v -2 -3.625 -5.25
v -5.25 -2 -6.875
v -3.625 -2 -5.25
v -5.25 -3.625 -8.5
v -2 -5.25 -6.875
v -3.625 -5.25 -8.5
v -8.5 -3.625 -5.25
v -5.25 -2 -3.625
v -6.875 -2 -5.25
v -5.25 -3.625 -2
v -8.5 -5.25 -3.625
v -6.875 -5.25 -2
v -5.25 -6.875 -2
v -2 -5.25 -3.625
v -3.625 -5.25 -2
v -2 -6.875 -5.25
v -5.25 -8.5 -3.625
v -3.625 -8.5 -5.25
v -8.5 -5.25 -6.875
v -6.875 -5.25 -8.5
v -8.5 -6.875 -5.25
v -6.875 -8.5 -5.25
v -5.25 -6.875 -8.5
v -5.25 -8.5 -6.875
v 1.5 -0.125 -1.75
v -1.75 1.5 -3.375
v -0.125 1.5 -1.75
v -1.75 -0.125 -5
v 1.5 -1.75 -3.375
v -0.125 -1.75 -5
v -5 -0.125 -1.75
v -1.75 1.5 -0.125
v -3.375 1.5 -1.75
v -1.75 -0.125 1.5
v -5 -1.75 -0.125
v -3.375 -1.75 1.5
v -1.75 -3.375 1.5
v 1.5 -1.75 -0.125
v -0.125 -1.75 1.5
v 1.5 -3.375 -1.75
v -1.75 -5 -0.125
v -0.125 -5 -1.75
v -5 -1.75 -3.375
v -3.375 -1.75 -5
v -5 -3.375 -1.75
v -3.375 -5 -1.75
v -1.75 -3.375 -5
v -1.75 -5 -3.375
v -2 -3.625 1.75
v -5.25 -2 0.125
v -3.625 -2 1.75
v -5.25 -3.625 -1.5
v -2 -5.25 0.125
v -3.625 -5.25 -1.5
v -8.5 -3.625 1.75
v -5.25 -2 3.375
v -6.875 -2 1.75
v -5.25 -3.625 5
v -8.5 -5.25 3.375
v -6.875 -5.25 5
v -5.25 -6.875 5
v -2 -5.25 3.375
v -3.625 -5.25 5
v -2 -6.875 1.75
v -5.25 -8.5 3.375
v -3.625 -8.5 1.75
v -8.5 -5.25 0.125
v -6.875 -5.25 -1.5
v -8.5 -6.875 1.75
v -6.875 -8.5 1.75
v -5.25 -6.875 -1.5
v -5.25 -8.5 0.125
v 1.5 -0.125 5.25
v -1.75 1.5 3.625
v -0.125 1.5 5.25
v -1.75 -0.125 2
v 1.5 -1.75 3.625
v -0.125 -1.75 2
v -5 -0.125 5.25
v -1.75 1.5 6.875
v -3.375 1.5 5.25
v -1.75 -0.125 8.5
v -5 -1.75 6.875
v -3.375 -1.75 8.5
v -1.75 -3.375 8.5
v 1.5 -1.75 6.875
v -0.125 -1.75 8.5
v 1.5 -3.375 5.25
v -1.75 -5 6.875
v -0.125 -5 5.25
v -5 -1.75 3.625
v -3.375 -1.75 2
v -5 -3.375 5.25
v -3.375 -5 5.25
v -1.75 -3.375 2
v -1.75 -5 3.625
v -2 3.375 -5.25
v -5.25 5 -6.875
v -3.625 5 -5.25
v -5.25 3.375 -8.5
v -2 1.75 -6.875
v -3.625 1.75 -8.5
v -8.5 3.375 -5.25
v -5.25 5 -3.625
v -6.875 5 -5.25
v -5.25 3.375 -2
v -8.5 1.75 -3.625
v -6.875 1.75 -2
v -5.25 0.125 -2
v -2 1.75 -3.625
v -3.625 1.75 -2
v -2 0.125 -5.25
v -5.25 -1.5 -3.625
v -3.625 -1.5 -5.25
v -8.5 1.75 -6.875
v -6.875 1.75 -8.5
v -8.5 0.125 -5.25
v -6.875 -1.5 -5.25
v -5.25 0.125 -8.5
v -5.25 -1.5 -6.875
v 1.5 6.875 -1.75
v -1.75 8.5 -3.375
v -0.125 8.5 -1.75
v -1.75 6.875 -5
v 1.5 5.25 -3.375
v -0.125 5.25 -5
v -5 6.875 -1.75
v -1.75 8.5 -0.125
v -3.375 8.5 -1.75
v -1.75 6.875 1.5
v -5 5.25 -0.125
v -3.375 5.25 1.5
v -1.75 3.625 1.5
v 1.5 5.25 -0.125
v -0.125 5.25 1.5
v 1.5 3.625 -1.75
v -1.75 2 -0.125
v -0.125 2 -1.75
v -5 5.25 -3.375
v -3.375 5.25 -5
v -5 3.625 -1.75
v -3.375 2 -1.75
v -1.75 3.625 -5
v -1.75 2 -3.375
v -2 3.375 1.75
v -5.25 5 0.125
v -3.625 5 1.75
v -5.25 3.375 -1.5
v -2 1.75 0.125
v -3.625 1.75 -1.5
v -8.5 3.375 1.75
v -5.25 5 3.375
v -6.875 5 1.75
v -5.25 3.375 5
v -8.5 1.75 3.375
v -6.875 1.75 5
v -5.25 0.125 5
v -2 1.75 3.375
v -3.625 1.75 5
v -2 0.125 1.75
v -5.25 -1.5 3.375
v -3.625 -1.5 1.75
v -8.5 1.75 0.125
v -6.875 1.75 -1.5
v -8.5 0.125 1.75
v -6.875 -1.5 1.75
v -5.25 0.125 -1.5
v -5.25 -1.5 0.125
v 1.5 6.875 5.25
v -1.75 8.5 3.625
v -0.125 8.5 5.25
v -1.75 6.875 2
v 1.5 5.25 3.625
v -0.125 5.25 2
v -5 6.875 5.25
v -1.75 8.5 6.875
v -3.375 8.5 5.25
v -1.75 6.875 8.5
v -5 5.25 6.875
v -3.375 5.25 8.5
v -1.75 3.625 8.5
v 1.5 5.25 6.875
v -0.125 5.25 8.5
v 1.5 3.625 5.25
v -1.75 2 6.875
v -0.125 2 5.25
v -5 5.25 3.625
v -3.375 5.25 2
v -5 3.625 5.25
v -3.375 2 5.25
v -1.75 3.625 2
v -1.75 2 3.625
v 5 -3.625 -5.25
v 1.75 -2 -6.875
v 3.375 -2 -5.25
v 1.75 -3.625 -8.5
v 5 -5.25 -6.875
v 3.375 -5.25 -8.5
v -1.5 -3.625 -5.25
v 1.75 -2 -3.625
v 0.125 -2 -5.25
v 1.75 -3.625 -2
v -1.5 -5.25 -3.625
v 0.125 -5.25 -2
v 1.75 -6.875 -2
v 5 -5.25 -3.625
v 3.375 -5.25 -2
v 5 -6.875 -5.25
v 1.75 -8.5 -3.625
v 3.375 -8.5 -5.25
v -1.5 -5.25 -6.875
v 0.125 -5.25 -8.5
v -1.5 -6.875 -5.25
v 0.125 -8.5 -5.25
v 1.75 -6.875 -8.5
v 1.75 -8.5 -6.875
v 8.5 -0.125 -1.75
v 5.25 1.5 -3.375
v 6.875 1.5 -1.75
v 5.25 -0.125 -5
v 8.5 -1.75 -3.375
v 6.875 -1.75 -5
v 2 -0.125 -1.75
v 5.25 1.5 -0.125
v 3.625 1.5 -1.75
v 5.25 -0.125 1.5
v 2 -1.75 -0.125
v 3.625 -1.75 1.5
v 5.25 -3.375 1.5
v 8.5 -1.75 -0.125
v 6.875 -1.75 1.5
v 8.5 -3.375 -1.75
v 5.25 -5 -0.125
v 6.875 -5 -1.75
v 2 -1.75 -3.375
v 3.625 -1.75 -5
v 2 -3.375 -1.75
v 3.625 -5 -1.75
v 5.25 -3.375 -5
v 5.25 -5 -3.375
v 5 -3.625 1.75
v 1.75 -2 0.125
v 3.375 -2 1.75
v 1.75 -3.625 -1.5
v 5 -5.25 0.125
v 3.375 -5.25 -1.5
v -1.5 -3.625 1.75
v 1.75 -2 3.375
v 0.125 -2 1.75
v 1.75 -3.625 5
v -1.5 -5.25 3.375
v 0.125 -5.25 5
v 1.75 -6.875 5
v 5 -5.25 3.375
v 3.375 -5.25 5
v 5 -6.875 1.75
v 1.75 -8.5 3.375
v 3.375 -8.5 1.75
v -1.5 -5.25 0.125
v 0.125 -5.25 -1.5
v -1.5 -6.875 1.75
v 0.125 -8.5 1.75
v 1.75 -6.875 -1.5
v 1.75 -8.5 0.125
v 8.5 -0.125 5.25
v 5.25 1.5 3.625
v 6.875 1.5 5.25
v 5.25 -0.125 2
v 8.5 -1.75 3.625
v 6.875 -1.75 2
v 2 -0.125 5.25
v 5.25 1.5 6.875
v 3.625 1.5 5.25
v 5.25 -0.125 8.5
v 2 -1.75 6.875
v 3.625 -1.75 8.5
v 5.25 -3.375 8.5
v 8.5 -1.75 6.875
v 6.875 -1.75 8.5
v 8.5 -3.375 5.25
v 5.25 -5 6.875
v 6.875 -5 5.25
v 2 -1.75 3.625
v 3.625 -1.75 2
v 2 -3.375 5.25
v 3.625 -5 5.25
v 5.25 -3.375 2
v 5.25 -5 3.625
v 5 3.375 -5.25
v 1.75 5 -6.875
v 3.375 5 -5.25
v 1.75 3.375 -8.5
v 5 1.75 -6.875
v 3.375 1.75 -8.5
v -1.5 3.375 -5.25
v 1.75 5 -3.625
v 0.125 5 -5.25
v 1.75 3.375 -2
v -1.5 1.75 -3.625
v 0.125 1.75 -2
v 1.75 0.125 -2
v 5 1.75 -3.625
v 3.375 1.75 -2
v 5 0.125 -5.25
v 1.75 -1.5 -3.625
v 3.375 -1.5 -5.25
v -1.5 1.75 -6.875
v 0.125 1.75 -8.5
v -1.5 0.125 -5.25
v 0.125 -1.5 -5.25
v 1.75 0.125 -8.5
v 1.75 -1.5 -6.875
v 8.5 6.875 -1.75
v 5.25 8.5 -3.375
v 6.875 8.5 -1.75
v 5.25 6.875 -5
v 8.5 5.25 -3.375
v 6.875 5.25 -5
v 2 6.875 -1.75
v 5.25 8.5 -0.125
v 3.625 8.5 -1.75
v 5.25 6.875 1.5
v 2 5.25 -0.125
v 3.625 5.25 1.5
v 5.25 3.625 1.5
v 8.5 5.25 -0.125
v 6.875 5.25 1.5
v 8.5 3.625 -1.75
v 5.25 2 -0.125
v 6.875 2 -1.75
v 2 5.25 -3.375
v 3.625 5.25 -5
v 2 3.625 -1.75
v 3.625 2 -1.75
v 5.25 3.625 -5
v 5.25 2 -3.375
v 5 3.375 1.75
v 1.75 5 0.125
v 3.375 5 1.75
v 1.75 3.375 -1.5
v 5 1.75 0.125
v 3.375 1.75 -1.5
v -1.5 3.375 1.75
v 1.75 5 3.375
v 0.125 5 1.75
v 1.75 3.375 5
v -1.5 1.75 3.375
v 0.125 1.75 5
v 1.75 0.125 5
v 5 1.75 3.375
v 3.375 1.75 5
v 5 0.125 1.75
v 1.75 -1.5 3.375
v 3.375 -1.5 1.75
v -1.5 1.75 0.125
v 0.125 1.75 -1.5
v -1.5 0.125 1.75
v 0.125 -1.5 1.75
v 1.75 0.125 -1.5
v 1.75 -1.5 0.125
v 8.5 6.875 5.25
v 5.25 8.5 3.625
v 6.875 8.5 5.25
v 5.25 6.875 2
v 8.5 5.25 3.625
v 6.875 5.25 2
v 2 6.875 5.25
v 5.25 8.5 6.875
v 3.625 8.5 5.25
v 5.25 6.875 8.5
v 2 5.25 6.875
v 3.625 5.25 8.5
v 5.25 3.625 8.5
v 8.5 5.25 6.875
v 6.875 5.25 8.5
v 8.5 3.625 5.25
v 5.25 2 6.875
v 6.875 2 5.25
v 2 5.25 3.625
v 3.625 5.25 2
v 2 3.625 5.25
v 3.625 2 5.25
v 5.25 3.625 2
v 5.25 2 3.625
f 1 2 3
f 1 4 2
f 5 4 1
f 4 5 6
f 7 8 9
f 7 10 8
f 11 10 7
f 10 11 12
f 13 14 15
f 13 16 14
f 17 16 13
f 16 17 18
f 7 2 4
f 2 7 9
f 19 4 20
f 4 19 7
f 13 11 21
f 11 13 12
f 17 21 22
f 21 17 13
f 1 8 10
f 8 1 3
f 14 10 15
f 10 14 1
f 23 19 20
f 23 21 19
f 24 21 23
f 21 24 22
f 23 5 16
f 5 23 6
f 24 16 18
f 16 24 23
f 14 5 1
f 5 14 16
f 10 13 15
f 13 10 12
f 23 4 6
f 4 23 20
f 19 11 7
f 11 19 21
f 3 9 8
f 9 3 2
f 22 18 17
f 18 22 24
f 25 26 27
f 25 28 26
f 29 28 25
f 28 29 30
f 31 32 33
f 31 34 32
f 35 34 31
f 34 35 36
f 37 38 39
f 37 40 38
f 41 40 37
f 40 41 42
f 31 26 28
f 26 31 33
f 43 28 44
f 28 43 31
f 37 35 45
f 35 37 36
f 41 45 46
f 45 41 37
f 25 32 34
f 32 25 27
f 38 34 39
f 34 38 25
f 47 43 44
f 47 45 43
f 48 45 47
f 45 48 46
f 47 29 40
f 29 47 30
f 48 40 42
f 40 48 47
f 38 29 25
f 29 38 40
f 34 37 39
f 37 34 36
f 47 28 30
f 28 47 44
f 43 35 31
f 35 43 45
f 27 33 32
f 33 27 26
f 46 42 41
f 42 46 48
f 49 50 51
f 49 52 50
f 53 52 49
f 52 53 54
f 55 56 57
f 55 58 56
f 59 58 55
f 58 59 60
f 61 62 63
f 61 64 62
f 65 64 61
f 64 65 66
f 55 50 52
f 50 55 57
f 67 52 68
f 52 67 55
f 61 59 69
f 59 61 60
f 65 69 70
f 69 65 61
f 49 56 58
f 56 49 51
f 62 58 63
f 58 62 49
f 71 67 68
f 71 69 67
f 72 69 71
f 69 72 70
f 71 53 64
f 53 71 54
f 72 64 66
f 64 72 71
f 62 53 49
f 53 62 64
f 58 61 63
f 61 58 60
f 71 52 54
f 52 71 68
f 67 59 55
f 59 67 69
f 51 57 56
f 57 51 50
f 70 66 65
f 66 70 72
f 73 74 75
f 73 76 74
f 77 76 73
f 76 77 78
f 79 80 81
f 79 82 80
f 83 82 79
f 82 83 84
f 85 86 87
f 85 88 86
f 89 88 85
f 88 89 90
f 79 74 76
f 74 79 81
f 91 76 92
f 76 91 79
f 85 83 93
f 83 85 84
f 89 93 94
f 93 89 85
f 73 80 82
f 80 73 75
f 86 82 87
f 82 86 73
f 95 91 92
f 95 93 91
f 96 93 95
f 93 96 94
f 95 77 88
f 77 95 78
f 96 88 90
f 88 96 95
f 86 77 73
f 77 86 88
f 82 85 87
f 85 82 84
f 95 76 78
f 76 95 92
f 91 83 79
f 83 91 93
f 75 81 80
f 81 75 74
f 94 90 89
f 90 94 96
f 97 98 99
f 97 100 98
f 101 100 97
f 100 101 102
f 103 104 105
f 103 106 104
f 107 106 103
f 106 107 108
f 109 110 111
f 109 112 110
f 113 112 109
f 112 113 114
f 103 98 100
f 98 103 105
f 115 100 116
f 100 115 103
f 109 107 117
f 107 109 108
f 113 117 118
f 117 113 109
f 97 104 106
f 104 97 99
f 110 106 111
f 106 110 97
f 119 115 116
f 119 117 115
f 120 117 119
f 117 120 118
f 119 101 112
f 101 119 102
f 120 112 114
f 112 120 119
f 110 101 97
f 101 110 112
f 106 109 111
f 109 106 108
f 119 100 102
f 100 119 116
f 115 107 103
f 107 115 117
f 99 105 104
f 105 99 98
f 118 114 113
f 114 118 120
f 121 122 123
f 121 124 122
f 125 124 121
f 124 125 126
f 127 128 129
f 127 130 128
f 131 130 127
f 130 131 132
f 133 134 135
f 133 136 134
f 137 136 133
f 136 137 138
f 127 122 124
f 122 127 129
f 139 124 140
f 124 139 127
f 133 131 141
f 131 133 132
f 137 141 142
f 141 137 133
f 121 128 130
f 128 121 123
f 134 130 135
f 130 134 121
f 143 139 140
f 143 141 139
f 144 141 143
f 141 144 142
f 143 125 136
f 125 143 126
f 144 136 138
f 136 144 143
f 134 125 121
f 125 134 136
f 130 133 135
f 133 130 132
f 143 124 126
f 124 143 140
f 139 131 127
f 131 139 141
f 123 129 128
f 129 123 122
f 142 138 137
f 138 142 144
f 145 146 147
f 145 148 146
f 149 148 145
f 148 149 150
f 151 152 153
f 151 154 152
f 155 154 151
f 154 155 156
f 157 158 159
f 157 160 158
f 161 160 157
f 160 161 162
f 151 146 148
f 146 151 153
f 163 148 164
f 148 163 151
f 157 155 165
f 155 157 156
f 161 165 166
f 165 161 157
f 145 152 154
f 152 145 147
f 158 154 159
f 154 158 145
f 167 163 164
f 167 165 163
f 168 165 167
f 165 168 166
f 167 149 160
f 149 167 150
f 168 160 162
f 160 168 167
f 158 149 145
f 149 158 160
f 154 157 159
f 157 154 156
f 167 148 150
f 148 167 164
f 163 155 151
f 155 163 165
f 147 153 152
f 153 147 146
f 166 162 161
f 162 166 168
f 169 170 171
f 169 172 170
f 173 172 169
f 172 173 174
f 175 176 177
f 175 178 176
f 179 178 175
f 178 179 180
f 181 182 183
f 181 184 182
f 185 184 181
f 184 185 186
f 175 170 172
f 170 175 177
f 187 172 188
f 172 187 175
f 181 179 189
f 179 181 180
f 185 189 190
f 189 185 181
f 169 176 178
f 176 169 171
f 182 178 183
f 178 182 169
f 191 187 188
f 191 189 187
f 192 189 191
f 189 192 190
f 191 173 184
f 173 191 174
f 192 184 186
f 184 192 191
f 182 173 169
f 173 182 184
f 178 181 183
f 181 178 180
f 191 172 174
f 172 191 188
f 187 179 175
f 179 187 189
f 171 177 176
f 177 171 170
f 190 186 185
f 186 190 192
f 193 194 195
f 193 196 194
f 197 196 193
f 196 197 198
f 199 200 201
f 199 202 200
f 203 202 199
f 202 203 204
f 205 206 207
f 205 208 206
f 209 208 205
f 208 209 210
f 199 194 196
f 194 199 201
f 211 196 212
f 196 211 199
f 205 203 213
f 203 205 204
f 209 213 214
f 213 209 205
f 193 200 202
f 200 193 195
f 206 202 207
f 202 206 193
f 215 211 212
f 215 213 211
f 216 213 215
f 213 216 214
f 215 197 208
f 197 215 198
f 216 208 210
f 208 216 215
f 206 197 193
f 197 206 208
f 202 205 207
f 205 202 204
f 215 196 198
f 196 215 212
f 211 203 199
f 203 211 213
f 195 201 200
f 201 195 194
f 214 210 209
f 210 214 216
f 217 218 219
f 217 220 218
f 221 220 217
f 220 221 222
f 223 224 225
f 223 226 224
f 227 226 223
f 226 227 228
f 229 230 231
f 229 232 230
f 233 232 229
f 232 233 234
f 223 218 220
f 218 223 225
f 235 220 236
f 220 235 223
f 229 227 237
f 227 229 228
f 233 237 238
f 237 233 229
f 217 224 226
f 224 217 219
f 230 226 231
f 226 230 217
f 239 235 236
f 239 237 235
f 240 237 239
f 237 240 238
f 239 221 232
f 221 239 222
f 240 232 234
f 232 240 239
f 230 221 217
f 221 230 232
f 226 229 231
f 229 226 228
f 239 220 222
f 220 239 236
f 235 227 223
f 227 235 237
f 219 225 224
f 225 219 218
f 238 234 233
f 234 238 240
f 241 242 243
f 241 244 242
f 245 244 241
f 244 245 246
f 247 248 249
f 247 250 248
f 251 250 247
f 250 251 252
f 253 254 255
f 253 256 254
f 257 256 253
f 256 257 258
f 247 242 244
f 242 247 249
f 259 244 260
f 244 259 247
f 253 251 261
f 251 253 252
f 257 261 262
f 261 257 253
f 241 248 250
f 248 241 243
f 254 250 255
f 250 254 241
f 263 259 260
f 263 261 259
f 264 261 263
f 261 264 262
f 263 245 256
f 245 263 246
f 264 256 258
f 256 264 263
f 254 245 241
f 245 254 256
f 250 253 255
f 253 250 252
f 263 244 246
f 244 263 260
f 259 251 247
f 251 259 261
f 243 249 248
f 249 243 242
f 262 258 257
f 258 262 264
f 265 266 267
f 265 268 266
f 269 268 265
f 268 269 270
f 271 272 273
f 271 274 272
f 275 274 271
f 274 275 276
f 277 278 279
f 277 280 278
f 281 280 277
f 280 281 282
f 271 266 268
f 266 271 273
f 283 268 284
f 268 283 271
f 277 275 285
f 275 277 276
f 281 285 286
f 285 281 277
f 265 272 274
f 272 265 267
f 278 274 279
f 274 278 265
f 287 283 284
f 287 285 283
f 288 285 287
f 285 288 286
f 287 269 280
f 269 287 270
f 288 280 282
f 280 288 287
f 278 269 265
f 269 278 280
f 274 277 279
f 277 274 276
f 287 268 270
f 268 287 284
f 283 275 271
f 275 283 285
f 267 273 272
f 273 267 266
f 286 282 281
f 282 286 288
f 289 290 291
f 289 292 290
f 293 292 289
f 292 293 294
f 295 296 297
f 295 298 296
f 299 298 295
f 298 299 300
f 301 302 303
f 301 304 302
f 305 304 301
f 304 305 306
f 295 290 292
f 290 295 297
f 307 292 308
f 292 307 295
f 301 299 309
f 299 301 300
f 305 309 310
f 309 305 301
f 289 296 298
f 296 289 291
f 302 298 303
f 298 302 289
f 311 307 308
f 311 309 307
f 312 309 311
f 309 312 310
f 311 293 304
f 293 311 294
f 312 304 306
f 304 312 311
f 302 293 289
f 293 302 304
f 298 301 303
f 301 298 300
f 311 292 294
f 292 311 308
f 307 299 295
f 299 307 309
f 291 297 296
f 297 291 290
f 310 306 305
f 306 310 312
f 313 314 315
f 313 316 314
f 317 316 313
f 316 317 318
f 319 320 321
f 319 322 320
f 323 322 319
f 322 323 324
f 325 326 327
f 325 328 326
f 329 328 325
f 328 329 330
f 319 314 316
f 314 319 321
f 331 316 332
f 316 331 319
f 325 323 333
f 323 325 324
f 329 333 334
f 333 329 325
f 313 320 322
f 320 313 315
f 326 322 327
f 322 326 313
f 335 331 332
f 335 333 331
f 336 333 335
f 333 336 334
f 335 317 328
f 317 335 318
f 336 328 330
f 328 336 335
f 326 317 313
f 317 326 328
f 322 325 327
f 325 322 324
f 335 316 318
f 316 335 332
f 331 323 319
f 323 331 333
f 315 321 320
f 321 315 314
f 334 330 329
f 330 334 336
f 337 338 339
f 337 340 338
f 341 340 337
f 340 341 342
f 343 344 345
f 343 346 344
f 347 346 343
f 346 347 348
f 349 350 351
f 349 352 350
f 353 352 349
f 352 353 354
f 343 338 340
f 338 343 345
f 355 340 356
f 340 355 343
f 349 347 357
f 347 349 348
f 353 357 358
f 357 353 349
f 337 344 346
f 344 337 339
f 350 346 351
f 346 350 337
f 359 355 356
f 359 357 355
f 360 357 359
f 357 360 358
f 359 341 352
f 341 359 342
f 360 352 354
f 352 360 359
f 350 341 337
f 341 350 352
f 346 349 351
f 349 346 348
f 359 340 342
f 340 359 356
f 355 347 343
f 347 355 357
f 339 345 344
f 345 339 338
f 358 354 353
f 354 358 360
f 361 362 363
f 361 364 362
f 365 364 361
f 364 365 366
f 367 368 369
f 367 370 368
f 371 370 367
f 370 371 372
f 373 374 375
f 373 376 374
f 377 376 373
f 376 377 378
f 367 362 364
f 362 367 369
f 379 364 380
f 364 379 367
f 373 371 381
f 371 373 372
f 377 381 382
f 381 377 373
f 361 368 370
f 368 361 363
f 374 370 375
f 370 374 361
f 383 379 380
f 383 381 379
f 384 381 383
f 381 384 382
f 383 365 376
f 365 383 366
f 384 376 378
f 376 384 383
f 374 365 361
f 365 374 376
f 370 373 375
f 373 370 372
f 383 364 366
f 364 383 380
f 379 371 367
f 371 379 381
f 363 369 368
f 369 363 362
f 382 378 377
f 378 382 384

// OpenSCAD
//Size of a cavity
size=7; // [5:50]

//Wall thickness
thick = 0.5; //[0.5:0.1:2]

//Repetition
repeat = 2; // [1:50]

//Polyhedron type
poly=1; //[1:Truncated Octahedron=BCC, 2: Rhombohedron=FCC]

module rhombohedron(){
    render(){
        intersection(){
            cylinder(h=2,center=true,$fn=4);
            rotate([90,0,0])
                cylinder(h=2,center=true,$fn=4);
            rotate([0,90,0])
                cylinder(h=2,center=true,$fn=4);
        }
    }
}

module void_rhombo(size, thick, rep){
    thick0 = thick * sqrt(2);
    for(ix=[-rep[0]/2+0.25:rep[0]/2-0.75]){
        x = ix*size;
        for(iy=[-rep[1]/2+0.25:rep[1]/2-0.75]){
            y = iy*size;
            for(iz=[-rep[2]/2+0.25:rep[2]/2-0.75]){
                z = iz*size;
                translate([x,y,z]){
                    scale((size-thick0)/2){
                        rhombohedron();
                    }
                }
                translate([x,y+size/2,z+size/2]){
                    scale((size-thick0)/2){
                        rhombohedron();
                    }
                }
                translate([x+size/2,y,z+size/2]){
                    scale((size-thick0)/2){
                        rhombohedron();
                    }
                }
                translate([x+size/2,y+size/2,z]){
                    scale((size-thick0)/2){
                        rhombohedron();
                    }
                }
            }
        }
    }
}


        
module octahedron(){
    polyhedron(points=[[0,0,-1],[1,0,0],[0,1,0],[-1,0,0],[0,-1,0],[0,0,1]],faces=[[0,1,2],[0,2,3],[0,3,4],[0,4,1],[5,2,1],[5,3,2],[5,4,3],[5,1,4]]);
}


module truncocta(){
    render(){
        intersection(){
            scale(1.5)
                octahedron();
            scale(2)
                cube(center=true);
        }
    }
}


module void_truncocta(size, thick, rep=[1,1,1]){
    for(x=[-rep[0]/2+0.25:rep[0]/2-0.75]){
        for(y=[-rep[1]/2+0.25:rep[1]/2-0.75]){
            for(z=[-rep[2]/2+0.25:rep[2]/2-0.75]){
                translate([size*x,size*y,size*z])
                    scale((size-thick)/2)
                        truncocta();
                translate([size*(x+0.5),size*(y+0.5),size*(z+0.5)])
                    scale((size-thick)/2)
                        truncocta();
            }
        }
    }
}


if (poly==2)
    void_rhombo(size, thick, rep=[repeat,repeat,repeat]);
else   
    void_truncocta(size, thick, rep=[repeat,repeat,repeat]);
